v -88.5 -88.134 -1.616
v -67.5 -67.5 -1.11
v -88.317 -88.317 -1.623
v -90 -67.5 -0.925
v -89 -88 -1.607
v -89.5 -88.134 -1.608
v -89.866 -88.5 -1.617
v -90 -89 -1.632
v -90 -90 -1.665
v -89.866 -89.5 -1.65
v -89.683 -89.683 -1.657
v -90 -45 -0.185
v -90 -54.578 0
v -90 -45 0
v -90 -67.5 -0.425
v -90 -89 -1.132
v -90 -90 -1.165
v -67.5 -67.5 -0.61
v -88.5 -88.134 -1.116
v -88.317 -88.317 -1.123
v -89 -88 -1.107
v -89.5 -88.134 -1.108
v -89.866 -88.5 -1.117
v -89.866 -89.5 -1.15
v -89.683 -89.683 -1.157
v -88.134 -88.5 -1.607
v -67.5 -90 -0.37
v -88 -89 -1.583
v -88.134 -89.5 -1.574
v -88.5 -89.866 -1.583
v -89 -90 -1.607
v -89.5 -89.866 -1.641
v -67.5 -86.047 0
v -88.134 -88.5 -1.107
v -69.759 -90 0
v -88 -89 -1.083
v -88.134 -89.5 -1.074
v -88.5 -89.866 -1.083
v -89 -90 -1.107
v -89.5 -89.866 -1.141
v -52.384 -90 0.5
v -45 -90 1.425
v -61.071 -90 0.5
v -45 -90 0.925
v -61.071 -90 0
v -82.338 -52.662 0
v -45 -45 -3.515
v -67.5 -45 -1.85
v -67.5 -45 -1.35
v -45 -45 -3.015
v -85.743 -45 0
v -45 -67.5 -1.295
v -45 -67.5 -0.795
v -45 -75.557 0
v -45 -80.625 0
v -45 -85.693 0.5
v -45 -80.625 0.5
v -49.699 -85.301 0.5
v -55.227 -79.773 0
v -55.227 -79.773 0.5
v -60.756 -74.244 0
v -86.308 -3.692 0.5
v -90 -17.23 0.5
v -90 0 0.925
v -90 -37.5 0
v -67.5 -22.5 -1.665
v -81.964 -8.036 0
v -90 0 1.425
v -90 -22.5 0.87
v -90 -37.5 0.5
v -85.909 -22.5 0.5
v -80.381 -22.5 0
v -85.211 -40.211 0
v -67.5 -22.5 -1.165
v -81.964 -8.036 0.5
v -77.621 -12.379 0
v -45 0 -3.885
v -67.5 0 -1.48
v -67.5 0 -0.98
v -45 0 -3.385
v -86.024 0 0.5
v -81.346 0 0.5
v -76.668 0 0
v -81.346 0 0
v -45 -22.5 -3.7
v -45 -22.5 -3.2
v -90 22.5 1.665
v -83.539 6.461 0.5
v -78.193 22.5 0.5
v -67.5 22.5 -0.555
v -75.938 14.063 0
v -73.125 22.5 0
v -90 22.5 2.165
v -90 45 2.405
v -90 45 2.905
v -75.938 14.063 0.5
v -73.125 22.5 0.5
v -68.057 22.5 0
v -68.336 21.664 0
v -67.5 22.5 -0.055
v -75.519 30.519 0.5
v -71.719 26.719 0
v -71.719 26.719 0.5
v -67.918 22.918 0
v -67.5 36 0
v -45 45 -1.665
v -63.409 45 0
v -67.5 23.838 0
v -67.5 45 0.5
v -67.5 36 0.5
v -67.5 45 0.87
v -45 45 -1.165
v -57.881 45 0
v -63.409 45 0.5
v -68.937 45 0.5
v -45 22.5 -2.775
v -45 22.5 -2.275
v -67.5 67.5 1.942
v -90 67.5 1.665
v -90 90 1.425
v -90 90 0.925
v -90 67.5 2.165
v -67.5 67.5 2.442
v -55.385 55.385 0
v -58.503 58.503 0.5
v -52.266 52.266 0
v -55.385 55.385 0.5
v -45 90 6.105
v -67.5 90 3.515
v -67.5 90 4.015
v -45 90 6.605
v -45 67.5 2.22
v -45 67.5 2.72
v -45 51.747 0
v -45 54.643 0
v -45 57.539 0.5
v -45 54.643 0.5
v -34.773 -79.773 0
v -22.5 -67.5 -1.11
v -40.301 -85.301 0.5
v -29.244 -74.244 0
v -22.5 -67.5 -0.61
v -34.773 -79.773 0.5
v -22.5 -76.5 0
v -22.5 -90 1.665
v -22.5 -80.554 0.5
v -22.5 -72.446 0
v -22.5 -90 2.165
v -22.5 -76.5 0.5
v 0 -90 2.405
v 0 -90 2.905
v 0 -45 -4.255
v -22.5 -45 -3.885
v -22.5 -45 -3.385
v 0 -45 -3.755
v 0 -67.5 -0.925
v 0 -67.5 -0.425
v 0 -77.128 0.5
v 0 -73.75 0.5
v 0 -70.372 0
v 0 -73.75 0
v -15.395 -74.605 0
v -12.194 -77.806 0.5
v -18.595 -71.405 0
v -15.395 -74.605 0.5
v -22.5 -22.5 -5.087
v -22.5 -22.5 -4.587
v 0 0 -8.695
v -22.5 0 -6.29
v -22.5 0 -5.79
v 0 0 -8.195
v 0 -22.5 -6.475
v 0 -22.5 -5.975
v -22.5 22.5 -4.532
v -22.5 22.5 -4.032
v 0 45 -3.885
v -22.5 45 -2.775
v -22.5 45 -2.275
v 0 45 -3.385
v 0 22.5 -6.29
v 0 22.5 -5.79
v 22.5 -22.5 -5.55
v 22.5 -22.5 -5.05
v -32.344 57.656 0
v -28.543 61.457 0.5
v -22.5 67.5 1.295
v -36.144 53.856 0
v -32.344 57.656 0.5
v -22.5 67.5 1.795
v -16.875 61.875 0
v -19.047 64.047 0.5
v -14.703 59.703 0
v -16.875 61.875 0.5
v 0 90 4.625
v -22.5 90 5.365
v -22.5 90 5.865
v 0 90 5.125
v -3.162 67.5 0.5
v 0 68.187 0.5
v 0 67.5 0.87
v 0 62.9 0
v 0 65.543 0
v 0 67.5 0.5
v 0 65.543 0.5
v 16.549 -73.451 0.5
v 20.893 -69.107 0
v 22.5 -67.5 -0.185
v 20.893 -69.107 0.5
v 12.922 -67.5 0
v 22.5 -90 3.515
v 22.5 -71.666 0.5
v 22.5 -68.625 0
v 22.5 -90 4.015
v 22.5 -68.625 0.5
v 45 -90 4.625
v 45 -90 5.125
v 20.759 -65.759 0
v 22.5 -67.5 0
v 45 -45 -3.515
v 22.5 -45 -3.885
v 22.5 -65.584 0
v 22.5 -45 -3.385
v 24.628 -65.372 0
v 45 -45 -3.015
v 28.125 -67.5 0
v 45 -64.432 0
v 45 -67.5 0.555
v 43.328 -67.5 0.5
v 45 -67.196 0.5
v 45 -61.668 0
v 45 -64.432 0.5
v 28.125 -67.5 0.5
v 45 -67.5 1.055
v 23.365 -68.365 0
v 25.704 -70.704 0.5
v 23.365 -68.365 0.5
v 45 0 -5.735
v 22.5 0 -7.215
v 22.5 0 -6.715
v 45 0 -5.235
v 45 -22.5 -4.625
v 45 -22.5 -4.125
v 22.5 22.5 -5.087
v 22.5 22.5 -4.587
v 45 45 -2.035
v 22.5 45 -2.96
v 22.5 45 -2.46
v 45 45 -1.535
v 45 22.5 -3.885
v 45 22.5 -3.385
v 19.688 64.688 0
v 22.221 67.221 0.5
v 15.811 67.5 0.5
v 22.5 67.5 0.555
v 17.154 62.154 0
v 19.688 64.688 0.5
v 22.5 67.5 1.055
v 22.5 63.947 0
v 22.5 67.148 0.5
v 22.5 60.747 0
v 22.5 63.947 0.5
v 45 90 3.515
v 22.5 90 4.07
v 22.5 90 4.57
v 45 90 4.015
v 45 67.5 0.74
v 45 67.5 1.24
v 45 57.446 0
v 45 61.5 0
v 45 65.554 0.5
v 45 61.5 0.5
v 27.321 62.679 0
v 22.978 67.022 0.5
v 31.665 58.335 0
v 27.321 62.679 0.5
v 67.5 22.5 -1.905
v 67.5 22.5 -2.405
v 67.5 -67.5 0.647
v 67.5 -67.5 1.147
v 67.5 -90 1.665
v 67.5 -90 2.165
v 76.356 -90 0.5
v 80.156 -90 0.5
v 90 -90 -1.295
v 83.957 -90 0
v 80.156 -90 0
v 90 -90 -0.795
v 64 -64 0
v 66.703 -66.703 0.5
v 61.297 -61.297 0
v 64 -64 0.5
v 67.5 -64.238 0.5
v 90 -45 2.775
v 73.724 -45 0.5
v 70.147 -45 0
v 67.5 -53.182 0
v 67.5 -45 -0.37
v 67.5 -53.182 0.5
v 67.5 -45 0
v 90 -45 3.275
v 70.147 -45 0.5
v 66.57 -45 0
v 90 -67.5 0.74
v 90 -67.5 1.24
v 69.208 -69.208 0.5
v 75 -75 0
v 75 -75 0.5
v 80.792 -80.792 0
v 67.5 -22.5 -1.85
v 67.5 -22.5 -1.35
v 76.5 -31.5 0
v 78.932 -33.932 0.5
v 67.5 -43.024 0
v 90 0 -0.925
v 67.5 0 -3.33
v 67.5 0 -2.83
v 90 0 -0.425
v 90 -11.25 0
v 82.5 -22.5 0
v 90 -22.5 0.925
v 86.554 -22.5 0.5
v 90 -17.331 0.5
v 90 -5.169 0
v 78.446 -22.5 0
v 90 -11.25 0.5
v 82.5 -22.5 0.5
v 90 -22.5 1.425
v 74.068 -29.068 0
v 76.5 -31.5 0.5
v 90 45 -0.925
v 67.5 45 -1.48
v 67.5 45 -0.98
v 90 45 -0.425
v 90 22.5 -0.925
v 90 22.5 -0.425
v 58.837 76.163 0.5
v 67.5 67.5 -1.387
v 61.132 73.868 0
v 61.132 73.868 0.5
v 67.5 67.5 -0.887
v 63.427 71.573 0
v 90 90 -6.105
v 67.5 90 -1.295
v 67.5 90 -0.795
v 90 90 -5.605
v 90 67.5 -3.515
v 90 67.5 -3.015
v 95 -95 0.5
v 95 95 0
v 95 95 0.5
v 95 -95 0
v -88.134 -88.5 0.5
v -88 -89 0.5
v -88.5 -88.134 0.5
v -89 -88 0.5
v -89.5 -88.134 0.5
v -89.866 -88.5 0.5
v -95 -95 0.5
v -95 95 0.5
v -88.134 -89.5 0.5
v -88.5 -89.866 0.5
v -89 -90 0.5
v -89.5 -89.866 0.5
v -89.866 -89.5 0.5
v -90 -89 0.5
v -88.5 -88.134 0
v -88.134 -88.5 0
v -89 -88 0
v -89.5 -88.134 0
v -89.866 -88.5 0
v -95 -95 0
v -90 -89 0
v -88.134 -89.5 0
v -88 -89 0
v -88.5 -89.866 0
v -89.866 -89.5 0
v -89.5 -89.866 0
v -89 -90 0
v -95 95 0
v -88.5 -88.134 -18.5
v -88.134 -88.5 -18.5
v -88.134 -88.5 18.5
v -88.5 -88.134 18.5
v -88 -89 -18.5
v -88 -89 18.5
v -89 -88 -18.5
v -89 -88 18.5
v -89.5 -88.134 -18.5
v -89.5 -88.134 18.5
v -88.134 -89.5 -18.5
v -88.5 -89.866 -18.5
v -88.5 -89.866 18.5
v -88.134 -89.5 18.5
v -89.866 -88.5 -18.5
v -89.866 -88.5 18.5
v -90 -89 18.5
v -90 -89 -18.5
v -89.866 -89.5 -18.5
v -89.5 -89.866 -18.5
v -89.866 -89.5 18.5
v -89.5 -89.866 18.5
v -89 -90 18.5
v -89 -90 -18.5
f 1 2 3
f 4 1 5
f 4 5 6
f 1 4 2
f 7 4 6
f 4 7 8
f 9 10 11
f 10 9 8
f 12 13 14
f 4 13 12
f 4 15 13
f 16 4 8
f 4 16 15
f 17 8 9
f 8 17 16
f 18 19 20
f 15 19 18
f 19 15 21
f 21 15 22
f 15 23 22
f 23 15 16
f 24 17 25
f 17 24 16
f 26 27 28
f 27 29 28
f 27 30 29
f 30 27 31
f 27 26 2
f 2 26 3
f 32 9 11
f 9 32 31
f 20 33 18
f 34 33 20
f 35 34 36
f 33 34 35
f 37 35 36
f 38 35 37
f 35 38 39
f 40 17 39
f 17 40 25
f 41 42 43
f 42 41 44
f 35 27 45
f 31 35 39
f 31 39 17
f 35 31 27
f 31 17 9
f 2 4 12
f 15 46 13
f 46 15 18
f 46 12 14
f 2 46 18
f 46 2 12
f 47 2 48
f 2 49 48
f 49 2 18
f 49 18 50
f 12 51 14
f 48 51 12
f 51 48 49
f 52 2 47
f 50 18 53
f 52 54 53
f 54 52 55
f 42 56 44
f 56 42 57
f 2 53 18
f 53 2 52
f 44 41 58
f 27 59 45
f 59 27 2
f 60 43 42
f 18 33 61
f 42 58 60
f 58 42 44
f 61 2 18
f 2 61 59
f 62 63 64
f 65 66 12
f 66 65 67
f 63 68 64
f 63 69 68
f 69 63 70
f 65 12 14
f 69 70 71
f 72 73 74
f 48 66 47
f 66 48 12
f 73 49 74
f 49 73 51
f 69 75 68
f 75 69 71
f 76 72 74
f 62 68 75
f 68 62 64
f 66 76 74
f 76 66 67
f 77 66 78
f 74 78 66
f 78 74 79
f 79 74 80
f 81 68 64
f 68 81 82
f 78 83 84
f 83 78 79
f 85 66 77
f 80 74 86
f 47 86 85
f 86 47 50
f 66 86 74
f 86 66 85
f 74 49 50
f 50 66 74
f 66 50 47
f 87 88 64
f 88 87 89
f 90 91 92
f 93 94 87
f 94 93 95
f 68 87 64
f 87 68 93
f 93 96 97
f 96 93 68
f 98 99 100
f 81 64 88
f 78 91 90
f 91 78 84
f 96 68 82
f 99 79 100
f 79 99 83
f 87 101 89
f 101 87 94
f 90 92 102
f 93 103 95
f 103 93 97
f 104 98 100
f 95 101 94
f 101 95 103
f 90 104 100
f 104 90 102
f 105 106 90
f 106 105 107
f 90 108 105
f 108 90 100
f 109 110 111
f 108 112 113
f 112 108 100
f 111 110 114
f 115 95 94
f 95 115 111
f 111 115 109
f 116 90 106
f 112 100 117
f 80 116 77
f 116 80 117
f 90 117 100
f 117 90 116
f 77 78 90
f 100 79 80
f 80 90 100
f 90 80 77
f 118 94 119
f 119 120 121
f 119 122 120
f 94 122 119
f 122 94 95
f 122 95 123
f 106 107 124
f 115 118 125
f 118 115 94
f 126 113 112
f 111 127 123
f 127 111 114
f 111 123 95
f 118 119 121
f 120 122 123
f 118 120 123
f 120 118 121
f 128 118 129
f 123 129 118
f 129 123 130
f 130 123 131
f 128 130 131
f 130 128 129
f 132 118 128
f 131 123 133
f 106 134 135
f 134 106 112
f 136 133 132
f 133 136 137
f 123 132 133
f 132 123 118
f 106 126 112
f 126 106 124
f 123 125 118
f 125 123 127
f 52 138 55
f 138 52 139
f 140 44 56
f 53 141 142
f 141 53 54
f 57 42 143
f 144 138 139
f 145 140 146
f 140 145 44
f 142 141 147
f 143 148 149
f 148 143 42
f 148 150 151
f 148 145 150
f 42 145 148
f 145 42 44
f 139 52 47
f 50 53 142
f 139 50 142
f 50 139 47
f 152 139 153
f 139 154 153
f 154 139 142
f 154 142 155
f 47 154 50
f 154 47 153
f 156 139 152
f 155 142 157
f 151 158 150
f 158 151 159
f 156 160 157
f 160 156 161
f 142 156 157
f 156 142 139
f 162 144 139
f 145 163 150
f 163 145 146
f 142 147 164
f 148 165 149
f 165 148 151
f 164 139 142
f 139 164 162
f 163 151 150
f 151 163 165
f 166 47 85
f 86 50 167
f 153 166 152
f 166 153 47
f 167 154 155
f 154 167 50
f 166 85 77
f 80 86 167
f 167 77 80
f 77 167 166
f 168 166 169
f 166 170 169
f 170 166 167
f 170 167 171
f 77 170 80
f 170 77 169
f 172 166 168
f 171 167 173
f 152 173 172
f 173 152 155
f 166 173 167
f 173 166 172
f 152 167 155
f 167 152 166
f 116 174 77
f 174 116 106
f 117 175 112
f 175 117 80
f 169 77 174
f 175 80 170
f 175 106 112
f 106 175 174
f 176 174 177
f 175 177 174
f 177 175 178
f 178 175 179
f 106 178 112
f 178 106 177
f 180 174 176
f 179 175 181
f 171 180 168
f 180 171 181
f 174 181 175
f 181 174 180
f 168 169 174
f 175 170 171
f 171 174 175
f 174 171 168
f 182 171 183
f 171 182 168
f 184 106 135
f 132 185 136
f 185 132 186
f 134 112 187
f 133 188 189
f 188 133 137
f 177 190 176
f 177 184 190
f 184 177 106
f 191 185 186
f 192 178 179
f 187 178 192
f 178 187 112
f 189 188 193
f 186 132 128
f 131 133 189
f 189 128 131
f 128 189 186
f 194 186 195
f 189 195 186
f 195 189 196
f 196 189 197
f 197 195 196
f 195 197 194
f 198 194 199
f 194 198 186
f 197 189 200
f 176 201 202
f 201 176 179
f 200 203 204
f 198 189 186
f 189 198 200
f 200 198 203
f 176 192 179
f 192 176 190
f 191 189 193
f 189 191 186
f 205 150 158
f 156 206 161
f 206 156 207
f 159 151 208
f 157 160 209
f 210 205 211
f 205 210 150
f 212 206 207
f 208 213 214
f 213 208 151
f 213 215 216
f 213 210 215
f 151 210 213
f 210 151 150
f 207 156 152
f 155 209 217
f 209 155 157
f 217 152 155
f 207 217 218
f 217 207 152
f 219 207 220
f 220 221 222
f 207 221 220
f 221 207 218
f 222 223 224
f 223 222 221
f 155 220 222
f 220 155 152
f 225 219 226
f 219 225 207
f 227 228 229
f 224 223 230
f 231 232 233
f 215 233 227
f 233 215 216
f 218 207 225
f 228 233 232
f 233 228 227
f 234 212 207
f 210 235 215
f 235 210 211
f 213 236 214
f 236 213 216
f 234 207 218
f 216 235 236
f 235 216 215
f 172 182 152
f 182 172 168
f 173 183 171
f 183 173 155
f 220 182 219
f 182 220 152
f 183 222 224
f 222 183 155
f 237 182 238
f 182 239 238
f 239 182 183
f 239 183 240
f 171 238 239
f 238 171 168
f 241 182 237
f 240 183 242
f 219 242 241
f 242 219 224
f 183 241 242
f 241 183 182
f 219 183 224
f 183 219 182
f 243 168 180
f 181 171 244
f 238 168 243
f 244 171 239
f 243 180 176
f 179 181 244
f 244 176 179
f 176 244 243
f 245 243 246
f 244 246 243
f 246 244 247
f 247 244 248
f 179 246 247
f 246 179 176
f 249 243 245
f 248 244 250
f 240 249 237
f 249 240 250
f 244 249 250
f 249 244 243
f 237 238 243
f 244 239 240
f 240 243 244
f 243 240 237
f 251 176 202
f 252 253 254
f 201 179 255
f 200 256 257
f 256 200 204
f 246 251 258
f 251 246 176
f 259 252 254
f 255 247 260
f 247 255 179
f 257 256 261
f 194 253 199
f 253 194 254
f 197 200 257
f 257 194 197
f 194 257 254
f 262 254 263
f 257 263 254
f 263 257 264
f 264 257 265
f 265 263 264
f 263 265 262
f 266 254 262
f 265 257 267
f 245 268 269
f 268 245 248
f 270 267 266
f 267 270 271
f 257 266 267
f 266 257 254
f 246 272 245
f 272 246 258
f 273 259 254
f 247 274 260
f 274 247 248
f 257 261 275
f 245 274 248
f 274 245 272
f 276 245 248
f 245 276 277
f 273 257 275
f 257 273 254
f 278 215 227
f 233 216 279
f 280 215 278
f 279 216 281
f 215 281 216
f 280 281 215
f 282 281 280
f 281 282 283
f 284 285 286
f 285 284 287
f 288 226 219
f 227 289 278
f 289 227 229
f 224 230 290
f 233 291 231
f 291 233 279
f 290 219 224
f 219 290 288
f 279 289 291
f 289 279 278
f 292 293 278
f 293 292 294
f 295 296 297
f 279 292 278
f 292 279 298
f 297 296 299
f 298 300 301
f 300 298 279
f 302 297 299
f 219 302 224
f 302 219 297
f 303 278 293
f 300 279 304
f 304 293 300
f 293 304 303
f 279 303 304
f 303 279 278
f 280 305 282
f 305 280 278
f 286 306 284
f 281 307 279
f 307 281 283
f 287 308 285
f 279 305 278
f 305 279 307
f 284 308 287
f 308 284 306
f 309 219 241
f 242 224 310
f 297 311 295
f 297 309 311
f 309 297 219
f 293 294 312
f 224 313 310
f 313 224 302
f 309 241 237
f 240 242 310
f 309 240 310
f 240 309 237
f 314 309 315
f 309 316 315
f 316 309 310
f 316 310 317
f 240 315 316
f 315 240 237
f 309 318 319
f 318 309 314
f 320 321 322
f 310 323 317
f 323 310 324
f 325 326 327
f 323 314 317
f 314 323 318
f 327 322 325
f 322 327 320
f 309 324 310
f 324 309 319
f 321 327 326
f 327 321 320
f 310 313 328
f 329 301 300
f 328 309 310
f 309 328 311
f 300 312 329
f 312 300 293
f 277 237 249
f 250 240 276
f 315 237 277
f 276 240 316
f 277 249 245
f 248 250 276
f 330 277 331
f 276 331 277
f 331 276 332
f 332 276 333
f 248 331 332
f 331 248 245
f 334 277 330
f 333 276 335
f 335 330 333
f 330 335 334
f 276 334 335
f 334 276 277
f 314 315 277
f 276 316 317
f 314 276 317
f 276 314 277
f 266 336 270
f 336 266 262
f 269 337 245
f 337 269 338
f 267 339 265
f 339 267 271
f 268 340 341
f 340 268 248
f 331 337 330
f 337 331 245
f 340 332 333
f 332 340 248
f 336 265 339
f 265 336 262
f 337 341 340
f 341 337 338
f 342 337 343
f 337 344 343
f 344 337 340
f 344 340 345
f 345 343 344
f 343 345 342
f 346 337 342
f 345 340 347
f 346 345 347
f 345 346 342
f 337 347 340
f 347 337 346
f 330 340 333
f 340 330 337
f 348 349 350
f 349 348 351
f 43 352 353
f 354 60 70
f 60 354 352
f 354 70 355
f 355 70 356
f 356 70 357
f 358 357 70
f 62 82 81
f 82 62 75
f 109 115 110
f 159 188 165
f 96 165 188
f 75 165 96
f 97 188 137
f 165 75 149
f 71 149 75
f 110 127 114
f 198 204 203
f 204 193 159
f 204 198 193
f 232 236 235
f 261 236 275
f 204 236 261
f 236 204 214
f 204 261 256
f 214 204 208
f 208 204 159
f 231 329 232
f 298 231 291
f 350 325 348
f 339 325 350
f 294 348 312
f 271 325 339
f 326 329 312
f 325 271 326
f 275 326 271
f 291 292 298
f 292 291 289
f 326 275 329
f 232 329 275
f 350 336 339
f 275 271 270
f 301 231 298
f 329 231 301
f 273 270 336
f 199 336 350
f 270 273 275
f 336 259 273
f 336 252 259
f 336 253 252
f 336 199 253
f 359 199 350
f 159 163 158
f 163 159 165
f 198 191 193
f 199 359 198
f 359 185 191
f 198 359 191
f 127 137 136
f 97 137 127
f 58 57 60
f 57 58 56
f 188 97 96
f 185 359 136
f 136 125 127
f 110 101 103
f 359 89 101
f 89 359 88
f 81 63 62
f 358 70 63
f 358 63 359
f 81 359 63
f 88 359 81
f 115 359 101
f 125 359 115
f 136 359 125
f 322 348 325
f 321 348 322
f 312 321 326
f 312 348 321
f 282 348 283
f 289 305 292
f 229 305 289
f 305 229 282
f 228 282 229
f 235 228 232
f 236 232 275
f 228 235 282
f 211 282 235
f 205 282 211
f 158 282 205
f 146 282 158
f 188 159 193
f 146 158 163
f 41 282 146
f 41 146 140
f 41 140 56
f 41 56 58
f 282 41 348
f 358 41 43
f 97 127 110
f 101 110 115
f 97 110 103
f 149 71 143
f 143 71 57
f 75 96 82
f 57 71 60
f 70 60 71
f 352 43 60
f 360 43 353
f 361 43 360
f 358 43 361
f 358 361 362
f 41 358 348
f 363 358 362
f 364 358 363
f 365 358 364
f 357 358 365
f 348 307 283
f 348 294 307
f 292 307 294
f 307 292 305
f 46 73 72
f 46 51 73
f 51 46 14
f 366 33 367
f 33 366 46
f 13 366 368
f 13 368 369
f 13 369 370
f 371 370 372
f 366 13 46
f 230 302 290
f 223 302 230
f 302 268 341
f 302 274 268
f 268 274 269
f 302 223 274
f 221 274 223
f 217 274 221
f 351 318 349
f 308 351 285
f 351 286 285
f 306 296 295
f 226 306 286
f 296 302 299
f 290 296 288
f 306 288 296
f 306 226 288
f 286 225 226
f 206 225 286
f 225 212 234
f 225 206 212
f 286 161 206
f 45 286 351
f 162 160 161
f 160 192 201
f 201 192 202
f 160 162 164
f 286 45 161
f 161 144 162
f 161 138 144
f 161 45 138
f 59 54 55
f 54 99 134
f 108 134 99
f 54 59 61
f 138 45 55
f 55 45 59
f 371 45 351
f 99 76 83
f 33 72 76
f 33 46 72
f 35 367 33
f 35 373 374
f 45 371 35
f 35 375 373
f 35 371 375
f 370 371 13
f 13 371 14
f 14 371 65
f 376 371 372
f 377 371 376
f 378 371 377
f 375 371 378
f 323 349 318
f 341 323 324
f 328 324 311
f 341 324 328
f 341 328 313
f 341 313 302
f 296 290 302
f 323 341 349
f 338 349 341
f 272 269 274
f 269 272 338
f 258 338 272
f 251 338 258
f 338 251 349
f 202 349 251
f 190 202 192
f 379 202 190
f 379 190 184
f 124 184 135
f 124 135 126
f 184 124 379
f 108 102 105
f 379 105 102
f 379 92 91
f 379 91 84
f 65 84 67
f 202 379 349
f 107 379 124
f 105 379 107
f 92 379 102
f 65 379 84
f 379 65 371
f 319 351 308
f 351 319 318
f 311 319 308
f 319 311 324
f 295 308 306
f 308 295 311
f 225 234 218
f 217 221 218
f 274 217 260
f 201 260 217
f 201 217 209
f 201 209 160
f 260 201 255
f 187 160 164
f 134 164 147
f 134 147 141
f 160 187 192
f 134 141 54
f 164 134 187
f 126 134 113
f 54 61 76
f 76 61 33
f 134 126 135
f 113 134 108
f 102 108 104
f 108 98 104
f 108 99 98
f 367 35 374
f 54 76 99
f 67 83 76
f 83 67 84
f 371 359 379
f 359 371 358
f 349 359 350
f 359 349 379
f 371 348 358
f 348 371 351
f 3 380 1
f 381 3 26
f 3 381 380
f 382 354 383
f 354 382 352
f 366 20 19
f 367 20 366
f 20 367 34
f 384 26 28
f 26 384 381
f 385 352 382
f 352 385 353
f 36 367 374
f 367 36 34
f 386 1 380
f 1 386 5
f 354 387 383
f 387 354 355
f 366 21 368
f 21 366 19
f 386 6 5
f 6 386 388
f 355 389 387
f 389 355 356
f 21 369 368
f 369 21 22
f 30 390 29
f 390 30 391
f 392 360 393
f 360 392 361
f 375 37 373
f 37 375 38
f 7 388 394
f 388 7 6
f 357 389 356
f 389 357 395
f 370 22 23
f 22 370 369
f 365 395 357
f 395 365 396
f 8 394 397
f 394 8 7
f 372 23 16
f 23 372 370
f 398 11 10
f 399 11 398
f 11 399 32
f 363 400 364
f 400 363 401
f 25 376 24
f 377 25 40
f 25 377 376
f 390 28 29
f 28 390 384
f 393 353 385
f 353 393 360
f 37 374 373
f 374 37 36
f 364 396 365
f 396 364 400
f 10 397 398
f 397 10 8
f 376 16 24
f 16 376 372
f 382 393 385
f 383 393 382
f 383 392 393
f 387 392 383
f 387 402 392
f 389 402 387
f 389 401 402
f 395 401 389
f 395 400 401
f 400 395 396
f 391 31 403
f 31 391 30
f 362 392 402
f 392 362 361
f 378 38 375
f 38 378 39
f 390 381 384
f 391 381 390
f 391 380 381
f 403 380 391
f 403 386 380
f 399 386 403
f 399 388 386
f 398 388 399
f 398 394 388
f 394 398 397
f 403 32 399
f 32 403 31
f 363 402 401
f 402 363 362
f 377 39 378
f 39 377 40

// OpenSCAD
 /**************************************\
 *                                      *
 *   OpenSCAD Mesh Display              *
 *   by Thinkyhead - April 2017         *
 *                                      *
 *   Copy the grid output from Marlin,  *
 *   paste below as shown, and use      *
 *   OpenSCAD to see a visualization    *
 *   of your mesh.                      *
 *                                      *
 \**************************************/

$t = 0.15; // comment out during animation!
X = 0; Y = 1;
L = 0; R = 1; F = 2; B = 3;

//
// Sample Mesh - Replace with your own
//
measured_z = [
  [ -1.20, -1.13, -1.09, -1.03, -1.19 ],
  [ -1.16, -1.25, -1.27, -1.25, -1.08 ],
  [ -1.13, -1.26, -1.39, -1.31, -1.18 ],
  [ -1.09, -1.20, -1.26, -1.21, -1.18 ],
  [ -1.13, -0.99, -1.03, -1.06, -1.32 ]
];

//
// An offset to add to all points in the mesh
//
zadjust     = 0;

//
// Mesh characteristics
//
bed_size = [ 200, 200 ];

mesh_inset  = [ 10, 10, 10, 10 ]; // L, F, R, B

mesh_bounds = [
  [ mesh_inset[L], mesh_inset[F] ],
  [ bed_size[X] - mesh_inset[R], bed_size[Y] - mesh_inset[B] ]
];

mesh_size = mesh_bounds[1] - mesh_bounds[0];

                      // NOTE: Marlin meshes already subtract the probe offset
NAN         = 0;      // Z to use for un-measured points

//
// Geometry
//

max_z_scale   = 100;   // Scale at Time 0.5
min_z_scale   = 10;    // Scale at Time 0.0 and 1.0
thickness     = 0.5;   // thickness of the mesh triangles
tesselation   = 1;     // levels of tesselation from 0-2
alternation   = 2;     // direction change modulus (try it)

//
// Appearance
//

show_plane    = true;
show_labels   = true;
show_coords   = true;
arrow_length  = 5;

label_font_lg = "Arial";
label_font_sm = "Arial";
mesh_color    = [1,1,1,0.5];
plane_color   = [0.4,0.6,0.9,0.6];

//================================================ Derive useful values

big_z = max_2D(measured_z,0);
lil_z = min_2D(measured_z,0);

mean_value = (big_z + lil_z) / 2.0;

mesh_points_y = len(measured_z);
mesh_points_x = len(measured_z[0]);

xspace = mesh_size[X] / (mesh_points_x - 1);
yspace = mesh_size[Y] / (mesh_points_y - 1);

// At $t=0 and $t=1 scale will be 100%
z_scale_factor = min_z_scale + (($t > 0.5) ? 1.0 - $t : $t) * (max_z_scale - min_z_scale) * 2;

//
// Min and max recursive functions for 1D and 2D arrays
// Return the smallest or largest value in the array
//
function some_1D(b,i) = (i<len(b)-1) ? (b[i] && some_1D(b,i+1)) : b[i] != 0;
function some_2D(a,j) = (j<len(a)-1) ? some_2D(a,j+1) : some_1D(a[j], 0);
function min_1D(b,i) = (i<len(b)-1) ? min(b[i], min_1D(b,i+1)) : b[i];
function min_2D(a,j) = (j<len(a)-1) ? min_2D(a,j+1) : min_1D(a[j], 0);
function max_1D(b,i) = (i<len(b)-1) ? max(b[i], max_1D(b,i+1)) : b[i];
function max_2D(a,j) = (j<len(a)-1) ? max_2D(a,j+1) : max_1D(a[j], 0);

//
// Get the corner probe points of a grid square.
//
// Input  : x,y grid indexes
// Output : An array of the 4 corner points
//
function grid_square(x,y) = [
  [x * xspace, y * yspace, z_scale_factor * (measured_z[y][x] - mean_value)],
  [x * xspace, (y+1) * yspace, z_scale_factor * (measured_z[y+1][x] - mean_value)],
  [(x+1) * xspace, (y+1) * yspace, z_scale_factor * (measured_z[y+1][x+1] - mean_value)],
  [(x+1) * xspace, y * yspace, z_scale_factor * (measured_z[y][x+1] - mean_value)]
];

// The corner point of a grid square with Z centered on the mean
function pos(x,y,z) = [x * xspace, y * yspace, z_scale_factor * (z - mean_value)];

//
// Draw the point markers and labels
//
module point_markers(show_home=true) {
  // Mark the home position 0,0
  if (show_home)
    translate([1,1]) color([0,0,0,0.25])
      cylinder(r=1, h=z_scale_factor, center=true);

  for (x=[0:mesh_points_x-1], y=[0:mesh_points_y-1]) {
    z = measured_z[y][x] - zadjust;
    down = z < mean_value;
    xyz = pos(x, y, z);
    translate([ xyz[0], xyz[1] ]) {

      // Show the XY as well as the Z!
      if (show_coords) {
        color("black")
        translate([0,0,0.5]) {
          $fn=8;
          rotate([0,0]) {
            posx = floor(mesh_bounds[0][X] + x * xspace);
            posy = floor(mesh_bounds[0][Y] + y * yspace);
            text(str(posx, ",", posy), 2, label_font_sm, halign="center", valign="center");
          }
        }
      }

      translate([ 0, 0, xyz[2] ]) {
        // Label each point with the Z
        v = z - mean_value;
        if (show_labels) {

          color(abs(v) < 0.1 ? [0,0.5,0] : [0.25,0,0])
          translate([0,0,down?-10:10]) {

            $fn=8;
            rotate([90,0,$vpr.z])
              text(str(z), 6, label_font_lg, halign="center", valign="center");

            if (v)
              translate([0,0,down?-6:6]) rotate([90,0,$vpr.z])
                text(str(down || !v ? "" : "+", v), 3, label_font_sm, halign="center", valign="center");
          }
        }

        // Show an arrow pointing up or down
        if (v) {
          rotate([0, down ? 180 : 0]) translate([0,0,-1])
            cylinder(
              r1=0.5,
              r2=0.1,
              h=arrow_length, $fn=12, center=1
            );
        }
        else
          color([1,0,1,0.4]) sphere(r=1.0, $fn=20, center=1);
      }
    }
  }
}

//
// Split a square on the diagonal into
// two triangles and render them.
//
//     s : a square
//   alt : a flag to split on the other diagonal
//
module tesselated_square(s, alt=false) {
  add = [0,0,thickness];
  p1 = [
    s[0], s[1], s[2], s[3],
    s[0]+add, s[1]+add, s[2]+add, s[3]+add
  ];
  f1 = alt
      ? [ [0,1,3], [4,5,1,0], [4,7,5], [5,7,3,1], [7,4,0,3] ]
      : [ [0,1,2], [4,5,1,0], [4,6,5], [5,6,2,1], [6,4,0,2] ];
  f2 = alt
      ? [ [1,2,3], [5,6,2,1], [5,6,7], [6,7,3,2], [7,5,1,3] ]
      : [ [0,2,3], [4,6,2,0], [4,7,6], [6,7,3,2], [7,4,0,3] ];

  // Use the other diagonal
  polyhedron(points=p1, faces=f1);
  polyhedron(points=p1, faces=f2);
}

/**
 * The simplest mesh display
 */
module simple_mesh(show_plane=show_plane) {
  if (show_plane) color(plane_color) cube([mesh_size[X], mesh_size[Y], thickness]);
  color(mesh_color)
    for (x=[0:mesh_points_x-2], y=[0:mesh_points_y-2])
      tesselated_square(grid_square(x, y));
}

/**
 * Subdivide the mesh into smaller squares.
 */
module bilinear_mesh(show_plane=show_plane,tesselation=tesselation) {
  if (show_plane) color(plane_color) translate([-5,-5]) cube([mesh_size[X]+10, mesh_size[Y]+10, thickness]);

  if (some_2D(measured_z, 0)) {

    tesselation = tesselation % 4;
    color(mesh_color)
    for (x=[0:mesh_points_x-2], y=[0:mesh_points_y-2]) {
      square = grid_square(x, y);
      if (tesselation < 1) {
        tesselated_square(square,(x%alternation)-(y%alternation));
      }
      else {
        subdiv_4 = subdivided_square(square);
        if (tesselation < 2) {
          for (i=[0:3]) tesselated_square(subdiv_4[i],i%alternation);
        }
        else {
          for (i=[0:3]) {
            subdiv_16 = subdivided_square(subdiv_4[i]);
            if (tesselation < 3) {
              for (j=[0:3]) tesselated_square(subdiv_16[j],j%alternation);
            }
            else {
              for (j=[0:3]) {
                subdiv_64 = subdivided_square(subdiv_16[j]);
                if (tesselation < 4) {
                  for (k=[0:3]) tesselated_square(subdiv_64[k]);
                }
              }
            }
          }
        }
      }
    }

  }
}

//
// Subdivision helpers
//
function ctrz(a) = (a[0][2]+a[1][2]+a[3][2]+a[2][2])/4;
function avgx(a,i) = (a[i][0]+a[(i+1)%4][0])/2;
function avgy(a,i) = (a[i][1]+a[(i+1)%4][1])/2;
function avgz(a,i) = (a[i][2]+a[(i+1)%4][2])/2;

//
// Convert one square into 4, applying bilinear averaging
//
// Input  : 1 square (4 points)
// Output : An array of 4 squares
//
function subdivided_square(a) = [
  [ // SW square
    a[0],                          // SW
    [a[0][0],avgy(a,0),avgz(a,0)], // CW
    [avgx(a,1),avgy(a,0),ctrz(a)], // CC
    [avgx(a,1),a[0][1],avgz(a,3)]  // SC
  ],
  [ // NW square
    [a[0][0],avgy(a,0),avgz(a,0)], // CW
    a[1],                          // NW
    [avgx(a,1),a[1][1],avgz(a,1)], // NC
    [avgx(a,1),avgy(a,0),ctrz(a)]  // CC
  ],
  [ // NE square
    [avgx(a,1),avgy(a,0),ctrz(a)], // CC
    [avgx(a,1),a[1][1],avgz(a,1)], // NC
    a[2],                          // NE
    [a[2][0],avgy(a,0),avgz(a,2)]  // CE
  ],
  [ // SE square
    [avgx(a,1),a[0][1],avgz(a,3)], // SC
    [avgx(a,1),avgy(a,0),ctrz(a)], // CC
    [a[2][0],avgy(a,0),avgz(a,2)], // CE
    a[3]                           // SE
  ]
];


//================================================ Run the plan

translate([-mesh_size[X] / 2, -mesh_size[Y] / 2]) {
  $fn = 12;
  point_markers();
  bilinear_mesh();
}
